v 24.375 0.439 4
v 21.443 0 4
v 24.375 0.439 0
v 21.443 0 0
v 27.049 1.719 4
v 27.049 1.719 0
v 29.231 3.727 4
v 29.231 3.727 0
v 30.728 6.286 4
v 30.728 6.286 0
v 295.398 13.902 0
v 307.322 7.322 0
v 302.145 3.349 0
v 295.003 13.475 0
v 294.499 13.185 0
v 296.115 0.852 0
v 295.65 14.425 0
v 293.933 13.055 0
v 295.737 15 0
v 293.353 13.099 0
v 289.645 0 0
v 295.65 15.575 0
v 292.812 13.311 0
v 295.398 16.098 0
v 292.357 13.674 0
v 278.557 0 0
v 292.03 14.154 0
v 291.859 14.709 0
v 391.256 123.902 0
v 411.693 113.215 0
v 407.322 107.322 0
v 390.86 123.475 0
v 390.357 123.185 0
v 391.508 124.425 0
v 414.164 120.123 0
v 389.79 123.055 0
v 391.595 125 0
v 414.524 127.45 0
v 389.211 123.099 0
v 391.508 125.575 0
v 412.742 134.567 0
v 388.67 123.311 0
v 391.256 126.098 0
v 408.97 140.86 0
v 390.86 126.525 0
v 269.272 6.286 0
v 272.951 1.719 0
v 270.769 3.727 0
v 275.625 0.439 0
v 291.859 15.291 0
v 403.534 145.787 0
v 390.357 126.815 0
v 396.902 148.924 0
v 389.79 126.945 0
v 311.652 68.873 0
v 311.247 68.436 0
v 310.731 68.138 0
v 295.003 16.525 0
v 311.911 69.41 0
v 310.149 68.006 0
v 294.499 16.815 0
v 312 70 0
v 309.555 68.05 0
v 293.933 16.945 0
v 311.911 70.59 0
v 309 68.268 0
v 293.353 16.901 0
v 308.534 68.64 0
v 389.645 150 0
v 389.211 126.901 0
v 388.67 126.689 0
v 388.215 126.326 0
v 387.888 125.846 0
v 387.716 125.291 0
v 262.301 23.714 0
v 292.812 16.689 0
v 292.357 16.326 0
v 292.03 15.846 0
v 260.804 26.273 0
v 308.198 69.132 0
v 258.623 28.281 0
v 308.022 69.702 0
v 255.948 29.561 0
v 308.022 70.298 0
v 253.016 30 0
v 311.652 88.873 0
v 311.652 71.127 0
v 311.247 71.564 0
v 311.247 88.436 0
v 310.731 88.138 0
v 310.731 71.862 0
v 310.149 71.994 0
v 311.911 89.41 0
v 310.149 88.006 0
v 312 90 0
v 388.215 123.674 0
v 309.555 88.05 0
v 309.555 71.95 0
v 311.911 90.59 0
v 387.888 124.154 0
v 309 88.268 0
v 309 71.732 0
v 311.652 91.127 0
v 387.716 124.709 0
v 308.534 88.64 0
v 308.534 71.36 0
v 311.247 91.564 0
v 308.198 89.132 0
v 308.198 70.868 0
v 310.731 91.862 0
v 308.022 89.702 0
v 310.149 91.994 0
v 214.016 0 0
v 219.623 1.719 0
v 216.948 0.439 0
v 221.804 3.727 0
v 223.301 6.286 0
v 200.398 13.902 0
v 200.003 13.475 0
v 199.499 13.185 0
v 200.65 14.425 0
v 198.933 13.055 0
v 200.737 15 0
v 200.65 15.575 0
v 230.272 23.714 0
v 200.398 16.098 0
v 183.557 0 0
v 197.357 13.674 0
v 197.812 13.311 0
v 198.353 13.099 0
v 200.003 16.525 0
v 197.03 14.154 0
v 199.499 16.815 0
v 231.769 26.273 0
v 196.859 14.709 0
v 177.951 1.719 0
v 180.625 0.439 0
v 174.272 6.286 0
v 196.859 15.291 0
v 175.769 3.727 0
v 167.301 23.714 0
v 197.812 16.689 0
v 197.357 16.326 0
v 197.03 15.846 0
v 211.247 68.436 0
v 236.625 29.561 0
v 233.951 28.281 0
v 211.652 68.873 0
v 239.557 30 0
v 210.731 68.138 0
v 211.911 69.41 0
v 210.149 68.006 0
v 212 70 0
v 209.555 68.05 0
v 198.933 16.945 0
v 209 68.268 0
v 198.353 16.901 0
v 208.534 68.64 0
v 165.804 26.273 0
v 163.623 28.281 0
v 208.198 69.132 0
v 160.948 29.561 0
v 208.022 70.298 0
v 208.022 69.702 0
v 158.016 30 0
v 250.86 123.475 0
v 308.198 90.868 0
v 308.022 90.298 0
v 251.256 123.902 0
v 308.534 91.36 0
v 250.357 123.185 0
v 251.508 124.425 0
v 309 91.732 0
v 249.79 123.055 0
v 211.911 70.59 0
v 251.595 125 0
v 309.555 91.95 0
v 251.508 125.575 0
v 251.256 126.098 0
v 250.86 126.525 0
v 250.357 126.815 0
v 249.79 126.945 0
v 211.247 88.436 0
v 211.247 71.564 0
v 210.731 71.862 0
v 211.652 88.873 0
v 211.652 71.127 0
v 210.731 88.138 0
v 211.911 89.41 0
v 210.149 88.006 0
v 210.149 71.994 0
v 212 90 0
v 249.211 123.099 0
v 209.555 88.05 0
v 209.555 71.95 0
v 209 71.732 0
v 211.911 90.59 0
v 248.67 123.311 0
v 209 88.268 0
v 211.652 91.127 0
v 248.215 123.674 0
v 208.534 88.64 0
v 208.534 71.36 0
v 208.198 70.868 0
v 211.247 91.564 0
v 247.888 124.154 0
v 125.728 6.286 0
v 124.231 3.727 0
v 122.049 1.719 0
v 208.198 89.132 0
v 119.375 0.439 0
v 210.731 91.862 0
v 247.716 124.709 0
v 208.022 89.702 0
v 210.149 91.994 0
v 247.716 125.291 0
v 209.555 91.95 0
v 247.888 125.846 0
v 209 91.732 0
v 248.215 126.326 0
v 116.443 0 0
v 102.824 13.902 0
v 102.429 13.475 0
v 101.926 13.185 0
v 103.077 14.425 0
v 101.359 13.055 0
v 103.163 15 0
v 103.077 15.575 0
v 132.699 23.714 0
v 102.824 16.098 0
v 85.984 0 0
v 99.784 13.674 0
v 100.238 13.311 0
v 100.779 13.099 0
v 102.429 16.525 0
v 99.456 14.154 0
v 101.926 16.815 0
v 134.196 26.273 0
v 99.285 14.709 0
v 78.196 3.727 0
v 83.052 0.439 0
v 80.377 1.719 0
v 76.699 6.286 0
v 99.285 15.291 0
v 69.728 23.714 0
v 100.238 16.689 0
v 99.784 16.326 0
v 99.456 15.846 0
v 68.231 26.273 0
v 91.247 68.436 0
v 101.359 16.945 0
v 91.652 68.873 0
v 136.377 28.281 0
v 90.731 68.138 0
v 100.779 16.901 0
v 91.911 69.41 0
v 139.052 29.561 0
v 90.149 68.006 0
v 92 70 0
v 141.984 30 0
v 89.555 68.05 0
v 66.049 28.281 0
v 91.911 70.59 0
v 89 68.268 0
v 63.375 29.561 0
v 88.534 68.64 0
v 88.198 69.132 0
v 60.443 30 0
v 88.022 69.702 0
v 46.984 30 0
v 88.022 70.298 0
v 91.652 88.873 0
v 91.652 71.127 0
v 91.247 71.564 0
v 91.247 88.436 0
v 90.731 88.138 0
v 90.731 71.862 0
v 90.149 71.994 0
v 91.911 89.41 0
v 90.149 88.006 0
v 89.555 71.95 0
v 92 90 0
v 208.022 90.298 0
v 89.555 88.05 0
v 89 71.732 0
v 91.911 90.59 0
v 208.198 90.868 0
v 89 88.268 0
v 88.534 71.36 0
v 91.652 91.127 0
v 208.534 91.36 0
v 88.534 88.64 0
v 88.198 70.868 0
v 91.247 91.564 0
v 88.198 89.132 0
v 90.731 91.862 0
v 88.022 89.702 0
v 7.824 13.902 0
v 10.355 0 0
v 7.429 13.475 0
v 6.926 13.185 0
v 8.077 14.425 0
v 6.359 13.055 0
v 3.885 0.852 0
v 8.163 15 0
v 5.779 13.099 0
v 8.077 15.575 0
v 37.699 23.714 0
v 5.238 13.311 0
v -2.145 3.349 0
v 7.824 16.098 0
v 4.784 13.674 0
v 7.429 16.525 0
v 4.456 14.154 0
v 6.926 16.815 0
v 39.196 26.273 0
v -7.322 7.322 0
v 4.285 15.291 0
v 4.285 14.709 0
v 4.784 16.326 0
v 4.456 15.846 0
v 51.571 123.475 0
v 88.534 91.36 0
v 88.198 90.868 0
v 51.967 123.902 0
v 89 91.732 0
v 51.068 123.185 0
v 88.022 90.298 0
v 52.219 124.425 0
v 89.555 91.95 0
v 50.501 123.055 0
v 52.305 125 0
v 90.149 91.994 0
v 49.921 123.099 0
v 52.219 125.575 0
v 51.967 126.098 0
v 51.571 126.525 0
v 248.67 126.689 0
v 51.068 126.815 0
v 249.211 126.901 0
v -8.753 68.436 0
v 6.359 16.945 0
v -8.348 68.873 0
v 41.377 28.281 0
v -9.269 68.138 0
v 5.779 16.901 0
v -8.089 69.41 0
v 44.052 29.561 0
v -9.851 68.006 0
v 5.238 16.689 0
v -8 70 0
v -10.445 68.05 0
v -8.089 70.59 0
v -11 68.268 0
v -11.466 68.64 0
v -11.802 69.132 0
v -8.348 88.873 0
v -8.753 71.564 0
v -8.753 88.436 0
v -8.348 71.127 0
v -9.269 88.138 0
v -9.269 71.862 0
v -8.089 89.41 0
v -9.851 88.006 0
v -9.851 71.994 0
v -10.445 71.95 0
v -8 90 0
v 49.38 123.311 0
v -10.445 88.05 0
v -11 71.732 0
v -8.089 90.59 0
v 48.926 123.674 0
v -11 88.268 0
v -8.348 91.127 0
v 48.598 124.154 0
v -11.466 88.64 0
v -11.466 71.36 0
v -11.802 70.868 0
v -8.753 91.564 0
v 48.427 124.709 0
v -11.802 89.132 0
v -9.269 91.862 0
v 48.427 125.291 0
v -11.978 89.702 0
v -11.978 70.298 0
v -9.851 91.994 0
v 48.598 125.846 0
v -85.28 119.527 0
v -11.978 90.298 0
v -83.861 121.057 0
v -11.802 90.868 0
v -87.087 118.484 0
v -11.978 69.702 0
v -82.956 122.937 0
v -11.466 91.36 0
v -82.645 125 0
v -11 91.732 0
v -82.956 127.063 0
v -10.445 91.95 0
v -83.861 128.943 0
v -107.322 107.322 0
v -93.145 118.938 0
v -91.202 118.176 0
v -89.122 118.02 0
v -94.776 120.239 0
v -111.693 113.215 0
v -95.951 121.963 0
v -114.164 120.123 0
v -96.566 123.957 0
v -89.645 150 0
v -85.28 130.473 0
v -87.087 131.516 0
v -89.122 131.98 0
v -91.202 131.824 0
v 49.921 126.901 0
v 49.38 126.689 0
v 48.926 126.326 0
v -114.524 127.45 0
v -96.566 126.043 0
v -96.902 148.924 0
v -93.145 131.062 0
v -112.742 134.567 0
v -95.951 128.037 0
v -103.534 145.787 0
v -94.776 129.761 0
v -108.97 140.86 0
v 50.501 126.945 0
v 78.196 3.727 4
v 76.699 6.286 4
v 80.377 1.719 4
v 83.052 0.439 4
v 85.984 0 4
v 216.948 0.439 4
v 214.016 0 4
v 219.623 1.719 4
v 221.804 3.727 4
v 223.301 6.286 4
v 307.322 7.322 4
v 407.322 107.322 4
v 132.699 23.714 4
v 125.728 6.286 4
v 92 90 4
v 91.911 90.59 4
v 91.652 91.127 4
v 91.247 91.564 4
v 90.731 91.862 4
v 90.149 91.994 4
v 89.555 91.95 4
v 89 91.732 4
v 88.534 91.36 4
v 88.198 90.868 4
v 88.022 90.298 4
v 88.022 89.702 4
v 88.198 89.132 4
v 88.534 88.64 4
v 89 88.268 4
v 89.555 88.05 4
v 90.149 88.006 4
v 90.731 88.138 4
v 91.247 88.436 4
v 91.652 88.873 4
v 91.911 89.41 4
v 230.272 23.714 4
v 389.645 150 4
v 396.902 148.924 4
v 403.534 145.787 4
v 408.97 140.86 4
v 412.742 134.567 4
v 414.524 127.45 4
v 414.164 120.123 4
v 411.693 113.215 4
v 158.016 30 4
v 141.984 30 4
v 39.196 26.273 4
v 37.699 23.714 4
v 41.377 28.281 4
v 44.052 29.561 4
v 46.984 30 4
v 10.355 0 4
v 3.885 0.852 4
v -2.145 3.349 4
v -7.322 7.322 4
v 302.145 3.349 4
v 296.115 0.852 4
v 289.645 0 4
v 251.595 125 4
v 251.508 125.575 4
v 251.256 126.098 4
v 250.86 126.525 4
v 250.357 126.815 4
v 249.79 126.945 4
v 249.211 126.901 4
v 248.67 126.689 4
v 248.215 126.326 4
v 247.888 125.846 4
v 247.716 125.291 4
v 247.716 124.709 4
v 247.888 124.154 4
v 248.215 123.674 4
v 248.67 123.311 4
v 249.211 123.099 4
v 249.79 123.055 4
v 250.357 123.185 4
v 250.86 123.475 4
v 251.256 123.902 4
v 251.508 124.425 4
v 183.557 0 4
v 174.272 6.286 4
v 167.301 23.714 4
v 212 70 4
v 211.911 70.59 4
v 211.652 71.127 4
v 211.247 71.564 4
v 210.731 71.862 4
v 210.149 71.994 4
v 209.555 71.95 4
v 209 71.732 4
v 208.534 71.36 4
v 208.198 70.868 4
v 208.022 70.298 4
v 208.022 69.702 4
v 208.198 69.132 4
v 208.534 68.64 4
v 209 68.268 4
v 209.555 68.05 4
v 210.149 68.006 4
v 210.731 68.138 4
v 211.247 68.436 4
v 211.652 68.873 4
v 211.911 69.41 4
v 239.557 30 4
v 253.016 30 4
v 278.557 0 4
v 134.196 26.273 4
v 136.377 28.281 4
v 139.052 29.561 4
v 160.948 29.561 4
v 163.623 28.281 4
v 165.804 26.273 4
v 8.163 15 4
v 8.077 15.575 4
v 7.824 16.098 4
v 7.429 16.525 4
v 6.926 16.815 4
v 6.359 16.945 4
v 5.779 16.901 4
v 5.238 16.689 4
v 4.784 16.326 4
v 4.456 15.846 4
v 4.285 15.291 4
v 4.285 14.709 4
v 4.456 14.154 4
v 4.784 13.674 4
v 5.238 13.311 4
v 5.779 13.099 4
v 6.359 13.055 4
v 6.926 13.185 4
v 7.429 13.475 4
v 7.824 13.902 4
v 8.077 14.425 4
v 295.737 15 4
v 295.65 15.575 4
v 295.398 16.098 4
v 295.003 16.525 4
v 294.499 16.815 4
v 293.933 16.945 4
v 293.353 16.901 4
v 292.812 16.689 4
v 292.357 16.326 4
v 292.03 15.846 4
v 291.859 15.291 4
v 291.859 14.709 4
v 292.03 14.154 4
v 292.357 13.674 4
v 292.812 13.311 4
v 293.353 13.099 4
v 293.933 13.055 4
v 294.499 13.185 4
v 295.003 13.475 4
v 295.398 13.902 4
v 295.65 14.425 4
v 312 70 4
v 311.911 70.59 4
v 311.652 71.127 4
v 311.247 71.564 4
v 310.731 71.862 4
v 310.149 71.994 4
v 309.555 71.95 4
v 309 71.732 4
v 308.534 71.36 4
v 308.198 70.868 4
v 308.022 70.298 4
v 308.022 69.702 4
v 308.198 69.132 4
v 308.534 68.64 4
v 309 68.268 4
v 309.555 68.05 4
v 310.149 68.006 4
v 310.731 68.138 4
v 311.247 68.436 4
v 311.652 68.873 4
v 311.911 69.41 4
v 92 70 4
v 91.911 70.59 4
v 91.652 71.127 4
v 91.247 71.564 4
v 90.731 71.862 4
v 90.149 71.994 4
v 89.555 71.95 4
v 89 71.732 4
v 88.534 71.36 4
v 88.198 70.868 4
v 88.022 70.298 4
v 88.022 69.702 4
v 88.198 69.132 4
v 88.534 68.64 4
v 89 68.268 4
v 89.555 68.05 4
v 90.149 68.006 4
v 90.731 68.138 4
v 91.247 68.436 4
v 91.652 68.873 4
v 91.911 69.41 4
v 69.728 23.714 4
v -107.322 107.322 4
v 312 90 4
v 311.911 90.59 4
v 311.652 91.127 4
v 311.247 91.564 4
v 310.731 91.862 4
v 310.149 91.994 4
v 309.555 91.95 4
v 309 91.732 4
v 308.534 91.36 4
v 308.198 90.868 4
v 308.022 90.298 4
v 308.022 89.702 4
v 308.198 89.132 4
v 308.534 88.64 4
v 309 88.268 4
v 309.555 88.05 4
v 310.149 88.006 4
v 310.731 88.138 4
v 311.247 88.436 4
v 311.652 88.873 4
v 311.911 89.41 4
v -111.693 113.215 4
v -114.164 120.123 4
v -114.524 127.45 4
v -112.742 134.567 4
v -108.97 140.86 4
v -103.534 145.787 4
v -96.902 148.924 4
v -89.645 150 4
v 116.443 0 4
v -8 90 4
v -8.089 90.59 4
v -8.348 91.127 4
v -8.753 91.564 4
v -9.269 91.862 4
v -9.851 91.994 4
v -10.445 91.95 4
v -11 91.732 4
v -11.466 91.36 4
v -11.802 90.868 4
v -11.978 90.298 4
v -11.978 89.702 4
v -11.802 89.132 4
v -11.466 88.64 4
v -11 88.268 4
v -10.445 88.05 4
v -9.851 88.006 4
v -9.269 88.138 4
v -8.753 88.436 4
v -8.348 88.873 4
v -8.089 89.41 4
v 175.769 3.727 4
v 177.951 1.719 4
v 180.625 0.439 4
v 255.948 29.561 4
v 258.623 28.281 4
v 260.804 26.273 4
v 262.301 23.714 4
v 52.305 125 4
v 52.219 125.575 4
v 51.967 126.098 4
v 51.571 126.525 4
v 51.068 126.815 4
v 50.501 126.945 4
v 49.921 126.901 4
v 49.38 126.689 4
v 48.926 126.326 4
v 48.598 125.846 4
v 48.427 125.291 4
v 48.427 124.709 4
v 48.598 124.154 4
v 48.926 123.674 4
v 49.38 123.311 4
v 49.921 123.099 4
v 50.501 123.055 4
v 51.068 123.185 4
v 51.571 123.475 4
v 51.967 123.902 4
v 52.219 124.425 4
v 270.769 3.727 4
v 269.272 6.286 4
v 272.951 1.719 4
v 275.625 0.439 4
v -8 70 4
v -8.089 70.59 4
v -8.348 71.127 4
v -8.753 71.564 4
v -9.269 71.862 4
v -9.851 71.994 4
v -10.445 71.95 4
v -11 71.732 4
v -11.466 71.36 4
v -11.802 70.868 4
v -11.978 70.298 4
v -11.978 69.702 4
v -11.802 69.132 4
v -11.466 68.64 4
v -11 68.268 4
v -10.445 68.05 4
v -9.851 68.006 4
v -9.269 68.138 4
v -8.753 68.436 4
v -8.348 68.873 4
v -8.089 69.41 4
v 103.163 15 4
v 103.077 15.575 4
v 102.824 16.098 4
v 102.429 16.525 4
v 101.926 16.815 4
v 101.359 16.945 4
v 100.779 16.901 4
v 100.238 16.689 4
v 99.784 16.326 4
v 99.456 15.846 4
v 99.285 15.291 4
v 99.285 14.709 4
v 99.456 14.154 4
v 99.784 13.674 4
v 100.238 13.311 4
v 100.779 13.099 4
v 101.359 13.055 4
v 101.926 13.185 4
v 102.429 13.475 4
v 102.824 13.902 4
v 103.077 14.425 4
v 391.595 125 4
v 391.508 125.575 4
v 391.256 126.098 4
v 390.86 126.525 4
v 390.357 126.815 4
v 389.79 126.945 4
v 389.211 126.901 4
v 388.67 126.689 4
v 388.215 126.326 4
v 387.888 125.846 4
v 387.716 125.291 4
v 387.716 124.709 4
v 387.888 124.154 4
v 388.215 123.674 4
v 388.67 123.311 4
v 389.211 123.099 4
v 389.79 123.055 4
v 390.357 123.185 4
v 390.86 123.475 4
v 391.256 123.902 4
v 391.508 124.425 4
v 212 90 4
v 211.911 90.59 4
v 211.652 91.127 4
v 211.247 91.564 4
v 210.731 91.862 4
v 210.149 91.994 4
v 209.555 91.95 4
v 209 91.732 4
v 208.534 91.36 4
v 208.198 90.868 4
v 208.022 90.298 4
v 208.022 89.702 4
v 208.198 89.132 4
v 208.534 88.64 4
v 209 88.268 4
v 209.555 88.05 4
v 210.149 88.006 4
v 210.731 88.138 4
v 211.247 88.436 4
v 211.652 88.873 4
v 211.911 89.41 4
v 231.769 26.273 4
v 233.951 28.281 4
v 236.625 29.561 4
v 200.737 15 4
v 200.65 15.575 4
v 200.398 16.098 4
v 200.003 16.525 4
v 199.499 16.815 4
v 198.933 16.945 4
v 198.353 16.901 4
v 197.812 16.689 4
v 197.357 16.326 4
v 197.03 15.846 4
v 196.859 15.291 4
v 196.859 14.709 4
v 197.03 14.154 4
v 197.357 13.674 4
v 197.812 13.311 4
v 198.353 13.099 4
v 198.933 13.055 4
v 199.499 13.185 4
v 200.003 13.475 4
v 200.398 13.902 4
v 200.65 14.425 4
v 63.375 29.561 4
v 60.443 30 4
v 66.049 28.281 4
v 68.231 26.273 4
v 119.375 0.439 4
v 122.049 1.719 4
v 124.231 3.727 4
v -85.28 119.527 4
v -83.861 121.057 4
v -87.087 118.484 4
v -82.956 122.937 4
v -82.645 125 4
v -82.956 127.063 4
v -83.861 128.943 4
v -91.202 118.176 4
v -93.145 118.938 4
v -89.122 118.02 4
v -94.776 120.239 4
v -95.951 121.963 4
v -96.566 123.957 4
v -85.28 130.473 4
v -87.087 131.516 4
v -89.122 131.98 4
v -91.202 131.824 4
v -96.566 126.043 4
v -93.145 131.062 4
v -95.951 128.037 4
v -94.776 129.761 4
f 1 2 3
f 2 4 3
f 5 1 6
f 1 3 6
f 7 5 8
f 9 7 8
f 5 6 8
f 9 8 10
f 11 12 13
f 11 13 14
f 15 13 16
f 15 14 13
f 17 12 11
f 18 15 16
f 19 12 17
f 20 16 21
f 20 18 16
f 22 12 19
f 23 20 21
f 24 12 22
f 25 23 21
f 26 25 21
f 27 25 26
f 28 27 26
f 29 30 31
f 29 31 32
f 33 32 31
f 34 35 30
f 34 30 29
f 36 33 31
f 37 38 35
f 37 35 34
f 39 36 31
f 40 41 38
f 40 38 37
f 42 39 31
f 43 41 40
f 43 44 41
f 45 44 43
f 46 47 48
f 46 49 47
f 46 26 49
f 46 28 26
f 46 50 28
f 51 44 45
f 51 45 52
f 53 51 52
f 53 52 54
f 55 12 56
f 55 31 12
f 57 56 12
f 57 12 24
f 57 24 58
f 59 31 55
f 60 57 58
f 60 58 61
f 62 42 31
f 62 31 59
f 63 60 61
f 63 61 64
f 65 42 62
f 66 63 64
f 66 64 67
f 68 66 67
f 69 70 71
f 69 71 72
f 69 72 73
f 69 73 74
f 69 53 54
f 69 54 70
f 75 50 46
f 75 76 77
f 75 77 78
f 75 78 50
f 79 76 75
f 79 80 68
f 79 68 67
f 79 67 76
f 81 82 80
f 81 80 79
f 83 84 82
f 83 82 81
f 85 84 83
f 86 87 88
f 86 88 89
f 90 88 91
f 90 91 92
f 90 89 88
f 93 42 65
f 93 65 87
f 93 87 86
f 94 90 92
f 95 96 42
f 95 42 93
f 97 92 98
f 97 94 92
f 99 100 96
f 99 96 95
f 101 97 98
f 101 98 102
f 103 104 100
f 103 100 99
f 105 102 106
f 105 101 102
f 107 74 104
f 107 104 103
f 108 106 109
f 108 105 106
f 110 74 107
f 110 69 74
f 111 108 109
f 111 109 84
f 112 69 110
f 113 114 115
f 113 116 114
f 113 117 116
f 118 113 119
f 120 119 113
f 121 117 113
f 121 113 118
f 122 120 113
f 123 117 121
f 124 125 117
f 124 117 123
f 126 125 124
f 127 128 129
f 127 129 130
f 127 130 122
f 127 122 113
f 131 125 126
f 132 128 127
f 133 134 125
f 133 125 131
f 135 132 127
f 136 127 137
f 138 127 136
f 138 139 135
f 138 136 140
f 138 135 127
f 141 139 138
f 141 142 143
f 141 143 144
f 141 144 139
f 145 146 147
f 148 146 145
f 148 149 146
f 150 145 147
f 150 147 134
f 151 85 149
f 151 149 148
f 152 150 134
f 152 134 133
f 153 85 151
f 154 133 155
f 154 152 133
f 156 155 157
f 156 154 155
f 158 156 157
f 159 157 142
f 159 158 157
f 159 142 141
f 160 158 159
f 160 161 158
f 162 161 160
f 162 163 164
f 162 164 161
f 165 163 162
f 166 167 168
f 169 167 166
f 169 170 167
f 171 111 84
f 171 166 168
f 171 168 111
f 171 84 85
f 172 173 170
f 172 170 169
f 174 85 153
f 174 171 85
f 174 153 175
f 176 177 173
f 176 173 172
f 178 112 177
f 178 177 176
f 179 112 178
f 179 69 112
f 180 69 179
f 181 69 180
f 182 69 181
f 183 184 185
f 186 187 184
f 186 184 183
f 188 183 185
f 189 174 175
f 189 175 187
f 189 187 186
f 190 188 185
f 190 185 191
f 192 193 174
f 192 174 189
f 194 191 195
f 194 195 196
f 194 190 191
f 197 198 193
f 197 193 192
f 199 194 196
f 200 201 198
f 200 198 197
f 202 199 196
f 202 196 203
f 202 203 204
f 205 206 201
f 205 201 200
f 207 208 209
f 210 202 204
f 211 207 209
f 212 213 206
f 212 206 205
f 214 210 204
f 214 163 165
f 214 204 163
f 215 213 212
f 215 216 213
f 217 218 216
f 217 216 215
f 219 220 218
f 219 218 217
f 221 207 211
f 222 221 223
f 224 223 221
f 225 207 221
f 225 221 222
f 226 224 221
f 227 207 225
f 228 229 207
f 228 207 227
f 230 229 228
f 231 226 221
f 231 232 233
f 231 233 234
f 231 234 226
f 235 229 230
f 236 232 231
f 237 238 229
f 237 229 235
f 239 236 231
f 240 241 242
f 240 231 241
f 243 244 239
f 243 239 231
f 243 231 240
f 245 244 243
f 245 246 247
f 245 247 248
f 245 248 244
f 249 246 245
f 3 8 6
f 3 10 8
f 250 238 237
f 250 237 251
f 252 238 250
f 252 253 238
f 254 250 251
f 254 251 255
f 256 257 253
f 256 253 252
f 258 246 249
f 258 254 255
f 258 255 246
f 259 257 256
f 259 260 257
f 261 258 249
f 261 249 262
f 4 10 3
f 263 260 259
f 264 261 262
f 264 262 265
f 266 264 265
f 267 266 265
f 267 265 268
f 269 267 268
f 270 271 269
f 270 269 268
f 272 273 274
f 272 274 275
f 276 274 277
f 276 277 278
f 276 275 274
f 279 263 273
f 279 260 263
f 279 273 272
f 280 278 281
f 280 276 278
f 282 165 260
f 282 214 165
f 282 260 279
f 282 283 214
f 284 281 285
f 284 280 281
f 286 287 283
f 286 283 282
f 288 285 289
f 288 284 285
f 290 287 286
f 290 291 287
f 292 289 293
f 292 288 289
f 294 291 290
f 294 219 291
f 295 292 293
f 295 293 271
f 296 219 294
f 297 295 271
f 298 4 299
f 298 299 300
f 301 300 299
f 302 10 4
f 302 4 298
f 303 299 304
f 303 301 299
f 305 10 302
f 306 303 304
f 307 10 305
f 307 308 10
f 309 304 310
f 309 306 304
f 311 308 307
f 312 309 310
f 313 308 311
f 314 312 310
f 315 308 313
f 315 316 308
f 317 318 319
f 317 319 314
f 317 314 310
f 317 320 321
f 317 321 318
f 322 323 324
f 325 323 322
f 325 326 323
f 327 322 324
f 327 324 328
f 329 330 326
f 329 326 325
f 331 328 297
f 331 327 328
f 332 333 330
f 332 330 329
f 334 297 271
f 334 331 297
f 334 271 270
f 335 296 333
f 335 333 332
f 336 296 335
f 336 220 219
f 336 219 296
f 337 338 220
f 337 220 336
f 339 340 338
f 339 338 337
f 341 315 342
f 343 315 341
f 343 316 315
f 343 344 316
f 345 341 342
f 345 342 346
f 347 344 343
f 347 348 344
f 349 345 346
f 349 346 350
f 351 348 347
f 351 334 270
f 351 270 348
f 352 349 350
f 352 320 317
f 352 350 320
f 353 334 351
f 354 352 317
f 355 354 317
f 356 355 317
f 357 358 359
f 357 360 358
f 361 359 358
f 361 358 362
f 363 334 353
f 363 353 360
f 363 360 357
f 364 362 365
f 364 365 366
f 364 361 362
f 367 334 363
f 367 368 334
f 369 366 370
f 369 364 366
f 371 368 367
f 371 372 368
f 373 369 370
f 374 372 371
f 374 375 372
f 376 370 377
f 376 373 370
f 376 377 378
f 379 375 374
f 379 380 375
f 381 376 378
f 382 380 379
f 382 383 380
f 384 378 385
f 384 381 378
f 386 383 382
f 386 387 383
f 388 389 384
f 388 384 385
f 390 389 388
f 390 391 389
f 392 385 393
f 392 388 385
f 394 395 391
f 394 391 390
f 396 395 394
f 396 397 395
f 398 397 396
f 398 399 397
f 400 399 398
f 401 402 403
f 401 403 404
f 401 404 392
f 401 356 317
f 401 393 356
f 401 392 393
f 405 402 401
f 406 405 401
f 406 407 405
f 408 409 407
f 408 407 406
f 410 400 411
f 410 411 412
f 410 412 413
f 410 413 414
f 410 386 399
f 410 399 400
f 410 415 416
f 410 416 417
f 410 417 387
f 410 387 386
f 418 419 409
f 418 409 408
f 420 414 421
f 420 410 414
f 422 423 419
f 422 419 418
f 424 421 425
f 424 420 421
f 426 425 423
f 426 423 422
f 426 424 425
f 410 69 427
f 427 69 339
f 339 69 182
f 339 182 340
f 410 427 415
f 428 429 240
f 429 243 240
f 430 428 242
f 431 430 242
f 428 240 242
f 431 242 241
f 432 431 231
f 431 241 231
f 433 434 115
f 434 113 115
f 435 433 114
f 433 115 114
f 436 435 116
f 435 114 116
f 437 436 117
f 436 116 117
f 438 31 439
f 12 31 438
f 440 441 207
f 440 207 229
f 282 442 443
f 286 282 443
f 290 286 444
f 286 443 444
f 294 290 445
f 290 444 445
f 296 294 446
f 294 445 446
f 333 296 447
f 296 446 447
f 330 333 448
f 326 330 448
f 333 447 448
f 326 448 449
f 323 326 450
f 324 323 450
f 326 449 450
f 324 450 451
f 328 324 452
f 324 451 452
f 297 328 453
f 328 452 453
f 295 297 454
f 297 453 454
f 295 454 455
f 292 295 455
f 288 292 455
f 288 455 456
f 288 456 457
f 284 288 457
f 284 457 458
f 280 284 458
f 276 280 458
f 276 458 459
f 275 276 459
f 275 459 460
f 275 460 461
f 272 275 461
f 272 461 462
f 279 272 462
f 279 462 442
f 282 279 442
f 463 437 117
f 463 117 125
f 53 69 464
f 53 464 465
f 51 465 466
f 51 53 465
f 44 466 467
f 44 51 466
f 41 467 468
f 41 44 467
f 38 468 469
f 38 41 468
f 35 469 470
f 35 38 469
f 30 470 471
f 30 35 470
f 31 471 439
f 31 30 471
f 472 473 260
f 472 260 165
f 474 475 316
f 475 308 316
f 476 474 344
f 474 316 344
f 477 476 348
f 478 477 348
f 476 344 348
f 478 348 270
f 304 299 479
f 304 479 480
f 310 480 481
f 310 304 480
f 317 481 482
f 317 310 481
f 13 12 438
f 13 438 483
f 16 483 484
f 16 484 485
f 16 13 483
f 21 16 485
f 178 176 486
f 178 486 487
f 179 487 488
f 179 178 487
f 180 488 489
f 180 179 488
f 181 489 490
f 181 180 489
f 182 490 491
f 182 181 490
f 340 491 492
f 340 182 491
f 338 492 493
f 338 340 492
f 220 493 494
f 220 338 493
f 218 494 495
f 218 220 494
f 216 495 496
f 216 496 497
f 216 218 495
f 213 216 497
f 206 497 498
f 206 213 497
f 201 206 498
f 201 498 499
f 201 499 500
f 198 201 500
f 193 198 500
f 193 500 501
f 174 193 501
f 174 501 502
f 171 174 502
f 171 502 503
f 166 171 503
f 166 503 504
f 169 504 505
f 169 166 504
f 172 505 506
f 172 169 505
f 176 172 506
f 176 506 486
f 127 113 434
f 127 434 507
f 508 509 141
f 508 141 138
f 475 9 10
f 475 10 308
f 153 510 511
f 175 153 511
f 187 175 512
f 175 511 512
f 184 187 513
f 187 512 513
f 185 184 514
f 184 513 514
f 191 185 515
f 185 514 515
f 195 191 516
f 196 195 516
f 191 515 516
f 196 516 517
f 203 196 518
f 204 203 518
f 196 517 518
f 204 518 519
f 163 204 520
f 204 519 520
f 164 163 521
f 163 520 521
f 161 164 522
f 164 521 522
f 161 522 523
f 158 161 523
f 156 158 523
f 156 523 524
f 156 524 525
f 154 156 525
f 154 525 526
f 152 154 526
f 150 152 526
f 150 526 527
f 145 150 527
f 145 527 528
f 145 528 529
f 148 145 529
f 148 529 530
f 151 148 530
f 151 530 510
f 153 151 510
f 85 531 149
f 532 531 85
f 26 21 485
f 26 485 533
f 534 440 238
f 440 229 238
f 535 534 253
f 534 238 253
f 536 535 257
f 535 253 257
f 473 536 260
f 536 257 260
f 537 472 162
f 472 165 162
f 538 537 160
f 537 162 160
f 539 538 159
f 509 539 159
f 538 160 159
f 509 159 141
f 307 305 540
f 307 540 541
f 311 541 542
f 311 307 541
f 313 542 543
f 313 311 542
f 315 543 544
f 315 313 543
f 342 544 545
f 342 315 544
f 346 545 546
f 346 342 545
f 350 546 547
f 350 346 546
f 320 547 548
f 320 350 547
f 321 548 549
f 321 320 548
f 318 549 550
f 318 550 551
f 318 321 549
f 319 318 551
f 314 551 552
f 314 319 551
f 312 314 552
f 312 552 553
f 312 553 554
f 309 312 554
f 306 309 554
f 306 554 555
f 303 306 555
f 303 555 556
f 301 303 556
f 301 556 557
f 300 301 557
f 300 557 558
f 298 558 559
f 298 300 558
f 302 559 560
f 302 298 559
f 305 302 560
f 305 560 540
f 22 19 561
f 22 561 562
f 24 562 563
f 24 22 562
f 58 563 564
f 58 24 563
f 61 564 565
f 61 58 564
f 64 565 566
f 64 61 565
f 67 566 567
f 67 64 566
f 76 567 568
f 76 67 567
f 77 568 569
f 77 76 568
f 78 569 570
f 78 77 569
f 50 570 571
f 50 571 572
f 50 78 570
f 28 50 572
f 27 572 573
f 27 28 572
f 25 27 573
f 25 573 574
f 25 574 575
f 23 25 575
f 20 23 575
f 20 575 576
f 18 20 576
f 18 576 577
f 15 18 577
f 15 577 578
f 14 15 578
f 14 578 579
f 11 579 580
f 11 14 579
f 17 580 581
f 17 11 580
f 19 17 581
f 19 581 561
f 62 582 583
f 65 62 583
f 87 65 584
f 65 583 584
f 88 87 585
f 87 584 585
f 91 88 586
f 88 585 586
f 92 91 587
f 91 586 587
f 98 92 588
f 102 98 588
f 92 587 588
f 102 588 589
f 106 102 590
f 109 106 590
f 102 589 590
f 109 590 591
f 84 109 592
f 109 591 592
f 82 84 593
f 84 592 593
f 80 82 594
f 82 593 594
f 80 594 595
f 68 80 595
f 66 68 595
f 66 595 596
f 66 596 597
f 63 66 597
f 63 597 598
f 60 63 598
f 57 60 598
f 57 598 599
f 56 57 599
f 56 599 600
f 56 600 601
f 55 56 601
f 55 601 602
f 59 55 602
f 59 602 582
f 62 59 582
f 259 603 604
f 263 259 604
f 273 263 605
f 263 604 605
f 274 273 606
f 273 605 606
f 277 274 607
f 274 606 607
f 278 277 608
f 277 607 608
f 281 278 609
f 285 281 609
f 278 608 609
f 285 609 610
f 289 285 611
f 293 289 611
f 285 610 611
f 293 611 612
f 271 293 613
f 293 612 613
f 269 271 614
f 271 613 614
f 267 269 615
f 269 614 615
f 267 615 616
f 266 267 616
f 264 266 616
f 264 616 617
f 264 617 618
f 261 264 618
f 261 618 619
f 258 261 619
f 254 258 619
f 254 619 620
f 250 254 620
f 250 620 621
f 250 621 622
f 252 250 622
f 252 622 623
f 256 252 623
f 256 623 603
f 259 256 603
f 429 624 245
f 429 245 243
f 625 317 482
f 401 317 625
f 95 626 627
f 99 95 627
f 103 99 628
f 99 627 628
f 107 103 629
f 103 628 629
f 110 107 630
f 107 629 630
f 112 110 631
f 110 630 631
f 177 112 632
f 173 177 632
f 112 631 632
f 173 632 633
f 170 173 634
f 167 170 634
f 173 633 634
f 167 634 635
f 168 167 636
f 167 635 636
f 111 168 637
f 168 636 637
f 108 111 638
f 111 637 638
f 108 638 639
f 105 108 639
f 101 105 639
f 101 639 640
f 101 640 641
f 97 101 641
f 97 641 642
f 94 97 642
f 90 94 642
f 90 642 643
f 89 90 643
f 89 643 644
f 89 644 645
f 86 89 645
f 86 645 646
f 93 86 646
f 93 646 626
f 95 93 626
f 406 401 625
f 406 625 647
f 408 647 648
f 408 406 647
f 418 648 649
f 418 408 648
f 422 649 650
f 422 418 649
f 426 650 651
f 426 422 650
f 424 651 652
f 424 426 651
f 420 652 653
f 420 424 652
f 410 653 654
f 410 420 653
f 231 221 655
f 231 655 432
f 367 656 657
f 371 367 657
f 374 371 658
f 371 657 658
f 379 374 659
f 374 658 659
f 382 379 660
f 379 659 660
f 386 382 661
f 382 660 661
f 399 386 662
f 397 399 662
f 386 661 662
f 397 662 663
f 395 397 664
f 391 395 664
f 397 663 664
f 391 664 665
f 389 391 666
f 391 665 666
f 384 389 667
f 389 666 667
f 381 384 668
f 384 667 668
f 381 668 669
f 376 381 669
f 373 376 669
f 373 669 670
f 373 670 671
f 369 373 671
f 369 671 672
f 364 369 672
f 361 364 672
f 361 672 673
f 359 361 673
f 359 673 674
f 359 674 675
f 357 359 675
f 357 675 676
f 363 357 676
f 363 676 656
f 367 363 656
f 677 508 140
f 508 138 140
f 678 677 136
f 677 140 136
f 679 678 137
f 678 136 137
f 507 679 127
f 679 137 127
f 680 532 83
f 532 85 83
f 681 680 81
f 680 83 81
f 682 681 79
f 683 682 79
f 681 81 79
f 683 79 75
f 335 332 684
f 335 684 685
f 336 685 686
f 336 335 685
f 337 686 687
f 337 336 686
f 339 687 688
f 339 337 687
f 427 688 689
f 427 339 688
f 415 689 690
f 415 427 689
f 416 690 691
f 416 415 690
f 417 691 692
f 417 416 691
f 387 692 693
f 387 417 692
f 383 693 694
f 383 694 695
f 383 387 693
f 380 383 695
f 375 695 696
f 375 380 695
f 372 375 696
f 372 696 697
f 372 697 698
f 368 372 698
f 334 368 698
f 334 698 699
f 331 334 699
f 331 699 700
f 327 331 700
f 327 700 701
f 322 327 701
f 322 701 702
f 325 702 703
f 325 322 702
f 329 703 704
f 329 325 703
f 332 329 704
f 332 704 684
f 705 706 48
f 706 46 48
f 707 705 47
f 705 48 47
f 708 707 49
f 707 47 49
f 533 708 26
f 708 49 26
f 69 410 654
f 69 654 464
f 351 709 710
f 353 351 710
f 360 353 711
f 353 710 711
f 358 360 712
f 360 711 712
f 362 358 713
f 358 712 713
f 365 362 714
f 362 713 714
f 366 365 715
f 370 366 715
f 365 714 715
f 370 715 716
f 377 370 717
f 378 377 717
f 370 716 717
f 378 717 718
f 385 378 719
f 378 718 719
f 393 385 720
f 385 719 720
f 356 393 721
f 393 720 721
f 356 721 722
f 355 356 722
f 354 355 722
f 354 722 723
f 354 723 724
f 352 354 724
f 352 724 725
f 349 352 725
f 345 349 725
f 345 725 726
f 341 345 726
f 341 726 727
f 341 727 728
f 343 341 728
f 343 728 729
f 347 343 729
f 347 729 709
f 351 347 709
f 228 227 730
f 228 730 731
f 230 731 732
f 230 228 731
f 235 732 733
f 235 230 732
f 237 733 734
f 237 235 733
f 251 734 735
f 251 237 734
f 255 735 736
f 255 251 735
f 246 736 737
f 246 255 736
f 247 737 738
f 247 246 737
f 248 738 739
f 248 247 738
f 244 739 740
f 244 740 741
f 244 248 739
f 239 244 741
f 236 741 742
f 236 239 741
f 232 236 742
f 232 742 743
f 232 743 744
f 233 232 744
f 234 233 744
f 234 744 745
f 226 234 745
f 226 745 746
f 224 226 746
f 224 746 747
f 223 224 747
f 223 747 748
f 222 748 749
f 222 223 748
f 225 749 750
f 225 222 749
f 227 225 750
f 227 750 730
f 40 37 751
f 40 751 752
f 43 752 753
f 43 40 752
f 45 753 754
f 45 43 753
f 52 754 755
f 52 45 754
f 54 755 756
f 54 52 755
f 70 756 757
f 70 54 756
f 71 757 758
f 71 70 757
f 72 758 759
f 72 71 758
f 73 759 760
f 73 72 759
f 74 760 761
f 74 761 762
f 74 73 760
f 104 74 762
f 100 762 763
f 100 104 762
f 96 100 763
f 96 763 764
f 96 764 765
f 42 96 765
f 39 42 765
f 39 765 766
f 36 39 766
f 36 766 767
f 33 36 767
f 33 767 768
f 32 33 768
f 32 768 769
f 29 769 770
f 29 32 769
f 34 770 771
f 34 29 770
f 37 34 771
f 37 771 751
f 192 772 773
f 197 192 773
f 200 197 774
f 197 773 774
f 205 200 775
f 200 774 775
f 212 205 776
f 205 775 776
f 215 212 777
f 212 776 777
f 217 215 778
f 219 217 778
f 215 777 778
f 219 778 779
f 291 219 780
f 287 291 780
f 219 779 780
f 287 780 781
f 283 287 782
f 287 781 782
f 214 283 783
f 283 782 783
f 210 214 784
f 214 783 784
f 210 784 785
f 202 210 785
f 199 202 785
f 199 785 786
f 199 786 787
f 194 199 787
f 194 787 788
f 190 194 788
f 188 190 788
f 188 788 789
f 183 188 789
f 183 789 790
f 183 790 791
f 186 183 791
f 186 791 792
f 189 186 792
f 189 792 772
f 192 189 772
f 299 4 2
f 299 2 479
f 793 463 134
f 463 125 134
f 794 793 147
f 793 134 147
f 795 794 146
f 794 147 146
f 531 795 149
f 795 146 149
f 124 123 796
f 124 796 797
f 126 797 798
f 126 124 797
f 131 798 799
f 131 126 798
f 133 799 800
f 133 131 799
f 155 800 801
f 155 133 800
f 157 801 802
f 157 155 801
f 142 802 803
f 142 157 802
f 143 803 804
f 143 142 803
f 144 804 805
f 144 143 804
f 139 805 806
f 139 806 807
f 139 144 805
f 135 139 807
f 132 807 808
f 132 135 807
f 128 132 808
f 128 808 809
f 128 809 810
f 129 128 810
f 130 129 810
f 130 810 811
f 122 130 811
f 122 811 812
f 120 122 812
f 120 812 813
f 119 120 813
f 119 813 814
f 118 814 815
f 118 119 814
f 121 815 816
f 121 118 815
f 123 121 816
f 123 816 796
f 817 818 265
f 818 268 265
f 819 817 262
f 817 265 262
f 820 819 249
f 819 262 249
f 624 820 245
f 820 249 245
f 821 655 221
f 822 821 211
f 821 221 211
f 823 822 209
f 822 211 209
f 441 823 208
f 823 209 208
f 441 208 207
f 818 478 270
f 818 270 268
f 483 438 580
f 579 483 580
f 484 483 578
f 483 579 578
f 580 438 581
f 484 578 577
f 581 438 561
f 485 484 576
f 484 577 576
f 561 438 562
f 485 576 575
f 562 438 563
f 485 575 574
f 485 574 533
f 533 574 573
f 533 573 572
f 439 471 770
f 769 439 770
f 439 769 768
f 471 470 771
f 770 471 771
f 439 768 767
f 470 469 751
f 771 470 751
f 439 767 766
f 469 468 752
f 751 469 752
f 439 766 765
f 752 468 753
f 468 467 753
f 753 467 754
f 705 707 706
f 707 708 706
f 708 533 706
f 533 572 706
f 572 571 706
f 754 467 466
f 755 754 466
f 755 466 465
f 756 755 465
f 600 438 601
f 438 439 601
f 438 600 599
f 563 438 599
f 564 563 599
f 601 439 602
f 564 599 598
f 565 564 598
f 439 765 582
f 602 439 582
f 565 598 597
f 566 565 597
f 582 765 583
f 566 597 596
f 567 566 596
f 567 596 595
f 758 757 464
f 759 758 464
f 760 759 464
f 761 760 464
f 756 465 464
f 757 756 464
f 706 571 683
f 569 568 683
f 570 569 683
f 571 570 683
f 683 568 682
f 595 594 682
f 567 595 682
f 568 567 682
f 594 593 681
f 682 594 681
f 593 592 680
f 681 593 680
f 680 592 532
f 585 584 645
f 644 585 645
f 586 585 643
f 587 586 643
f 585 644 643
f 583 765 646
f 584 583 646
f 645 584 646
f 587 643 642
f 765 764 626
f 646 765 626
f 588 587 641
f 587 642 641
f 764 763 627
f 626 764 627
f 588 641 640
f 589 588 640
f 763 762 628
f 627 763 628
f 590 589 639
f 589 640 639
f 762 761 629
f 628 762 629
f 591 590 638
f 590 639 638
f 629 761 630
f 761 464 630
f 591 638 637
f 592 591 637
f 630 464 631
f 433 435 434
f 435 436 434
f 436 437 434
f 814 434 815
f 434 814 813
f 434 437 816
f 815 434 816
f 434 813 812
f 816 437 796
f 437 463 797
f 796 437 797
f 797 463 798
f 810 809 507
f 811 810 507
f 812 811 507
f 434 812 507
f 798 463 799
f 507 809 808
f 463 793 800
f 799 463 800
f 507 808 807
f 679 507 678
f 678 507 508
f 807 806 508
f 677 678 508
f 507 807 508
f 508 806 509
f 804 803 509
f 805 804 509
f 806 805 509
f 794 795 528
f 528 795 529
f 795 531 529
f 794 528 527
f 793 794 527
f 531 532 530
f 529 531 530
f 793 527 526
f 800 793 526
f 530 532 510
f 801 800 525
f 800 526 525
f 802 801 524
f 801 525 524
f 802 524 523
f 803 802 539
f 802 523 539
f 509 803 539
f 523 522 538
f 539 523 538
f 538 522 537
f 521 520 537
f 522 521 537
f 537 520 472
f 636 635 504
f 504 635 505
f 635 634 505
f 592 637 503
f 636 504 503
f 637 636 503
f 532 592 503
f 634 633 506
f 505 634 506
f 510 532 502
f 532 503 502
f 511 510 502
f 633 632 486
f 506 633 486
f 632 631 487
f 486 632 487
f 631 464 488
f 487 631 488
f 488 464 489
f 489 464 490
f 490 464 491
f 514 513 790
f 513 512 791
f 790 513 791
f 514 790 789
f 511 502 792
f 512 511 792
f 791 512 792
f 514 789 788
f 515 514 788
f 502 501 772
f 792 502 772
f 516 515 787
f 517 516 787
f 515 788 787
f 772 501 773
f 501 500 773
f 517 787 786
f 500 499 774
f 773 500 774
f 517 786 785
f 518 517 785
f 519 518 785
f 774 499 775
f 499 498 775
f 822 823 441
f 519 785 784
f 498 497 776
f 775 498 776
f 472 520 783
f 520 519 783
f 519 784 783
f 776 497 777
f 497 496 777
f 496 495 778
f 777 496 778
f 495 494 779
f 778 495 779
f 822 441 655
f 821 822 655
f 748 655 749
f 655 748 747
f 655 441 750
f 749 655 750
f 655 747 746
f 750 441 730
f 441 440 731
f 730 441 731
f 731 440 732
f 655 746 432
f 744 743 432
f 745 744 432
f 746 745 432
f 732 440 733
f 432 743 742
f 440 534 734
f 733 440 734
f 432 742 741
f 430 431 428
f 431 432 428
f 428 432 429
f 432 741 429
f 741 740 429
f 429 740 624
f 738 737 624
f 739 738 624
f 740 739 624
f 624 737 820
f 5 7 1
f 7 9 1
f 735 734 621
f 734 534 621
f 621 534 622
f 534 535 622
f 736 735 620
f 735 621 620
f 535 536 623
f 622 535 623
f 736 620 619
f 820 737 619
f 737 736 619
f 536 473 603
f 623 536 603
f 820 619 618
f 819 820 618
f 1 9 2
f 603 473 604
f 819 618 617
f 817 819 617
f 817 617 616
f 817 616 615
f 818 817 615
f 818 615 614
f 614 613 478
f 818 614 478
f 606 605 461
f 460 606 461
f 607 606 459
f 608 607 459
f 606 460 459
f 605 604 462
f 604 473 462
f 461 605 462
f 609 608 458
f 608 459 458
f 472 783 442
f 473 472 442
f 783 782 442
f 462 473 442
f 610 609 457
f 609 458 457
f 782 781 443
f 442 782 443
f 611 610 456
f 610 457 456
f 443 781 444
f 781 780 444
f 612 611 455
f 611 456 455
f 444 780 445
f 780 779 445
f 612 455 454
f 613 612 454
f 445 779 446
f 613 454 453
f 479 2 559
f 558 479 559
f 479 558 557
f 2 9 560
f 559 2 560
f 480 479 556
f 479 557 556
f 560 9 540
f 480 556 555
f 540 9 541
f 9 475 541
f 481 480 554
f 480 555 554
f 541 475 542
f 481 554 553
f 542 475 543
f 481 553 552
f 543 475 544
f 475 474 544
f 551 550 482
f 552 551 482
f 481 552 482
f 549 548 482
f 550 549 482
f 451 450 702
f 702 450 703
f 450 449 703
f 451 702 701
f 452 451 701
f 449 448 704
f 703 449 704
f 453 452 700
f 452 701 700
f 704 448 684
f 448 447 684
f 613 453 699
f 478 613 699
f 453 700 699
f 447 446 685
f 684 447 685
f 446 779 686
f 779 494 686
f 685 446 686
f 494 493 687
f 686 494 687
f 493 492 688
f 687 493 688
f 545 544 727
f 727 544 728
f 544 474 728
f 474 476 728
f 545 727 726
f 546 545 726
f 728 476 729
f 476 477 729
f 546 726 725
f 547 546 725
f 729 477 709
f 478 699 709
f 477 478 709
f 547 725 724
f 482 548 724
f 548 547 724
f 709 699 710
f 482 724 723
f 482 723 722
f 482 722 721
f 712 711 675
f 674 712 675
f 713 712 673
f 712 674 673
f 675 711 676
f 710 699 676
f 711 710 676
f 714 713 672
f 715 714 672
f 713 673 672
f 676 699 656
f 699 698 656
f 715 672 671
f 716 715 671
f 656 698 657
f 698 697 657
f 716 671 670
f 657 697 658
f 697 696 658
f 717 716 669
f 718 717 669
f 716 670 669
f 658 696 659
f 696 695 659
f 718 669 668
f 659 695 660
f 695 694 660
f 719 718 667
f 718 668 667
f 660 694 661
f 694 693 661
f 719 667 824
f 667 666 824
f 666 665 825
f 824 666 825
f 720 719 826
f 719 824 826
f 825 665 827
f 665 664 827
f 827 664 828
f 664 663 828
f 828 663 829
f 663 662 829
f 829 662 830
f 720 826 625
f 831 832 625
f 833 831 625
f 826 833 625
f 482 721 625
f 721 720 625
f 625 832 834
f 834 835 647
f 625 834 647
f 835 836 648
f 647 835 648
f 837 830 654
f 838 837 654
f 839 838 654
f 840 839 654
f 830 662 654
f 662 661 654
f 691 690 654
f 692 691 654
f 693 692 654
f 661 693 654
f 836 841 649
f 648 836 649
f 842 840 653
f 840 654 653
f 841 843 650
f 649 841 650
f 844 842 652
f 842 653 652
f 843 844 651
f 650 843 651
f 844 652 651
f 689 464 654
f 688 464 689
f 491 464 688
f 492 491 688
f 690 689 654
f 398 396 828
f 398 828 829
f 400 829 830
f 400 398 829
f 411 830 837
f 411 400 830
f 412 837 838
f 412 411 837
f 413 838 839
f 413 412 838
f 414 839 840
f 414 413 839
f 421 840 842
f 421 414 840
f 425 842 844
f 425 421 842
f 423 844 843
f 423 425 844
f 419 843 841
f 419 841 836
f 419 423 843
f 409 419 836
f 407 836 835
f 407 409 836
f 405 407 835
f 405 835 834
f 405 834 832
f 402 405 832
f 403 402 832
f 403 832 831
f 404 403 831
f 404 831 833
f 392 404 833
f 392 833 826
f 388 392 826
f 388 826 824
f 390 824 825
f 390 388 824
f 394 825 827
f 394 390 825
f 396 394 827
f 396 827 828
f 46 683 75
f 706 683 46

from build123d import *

# Parameters (mm, degrees)
SKETCH_1_R          = 1.95
SKETCH_1_R_2        = 7
EXTRUDE_1_DEPTH     = 4
SKETCH_2_R          = 2
CUT_EXTRUDE_1_DEPTH = 10
CUT_EXTRUDE_2_DEPTH = 10
FILLET_1_R          = 10


with BuildPart() as part:
    # 草图1 → 凸台-拉伸1 (new body)
    with BuildSketch(Plane.XY):
        with BuildLine():
            Line((-7.32233047, 7.32233047), (-107.32233047, 107.32233047))
            ThreePointArc((-107.32233047, 107.32233047), (-112.741649253, 134.567085809), (-89.644660941, 150))
            Line((-89.644660941, 150), (389.644660941, 150))
            ThreePointArc((389.644660941, 150), (412.741649253, 134.567085809), (407.32233047, 107.32233047))
            Line((407.32233047, 107.32233047), (307.32233047, 7.32233047))
            ThreePointArc((307.32233047, 7.32233047), (299.21174675, 1.903011687), (289.644660941, 0))
            Line((289.644660941, 0), (10.355339059, 0))
            ThreePointArc((10.355339059, 0), (0.78825325, 1.903011687), (-7.32233047, 7.32233047))
        make_face()
        with Locations((50.355339059, 125)):
            Circle(SKETCH_1_R, mode=Mode.SUBTRACT)
        with Locations((249.644660941, 125)):
            Circle(SKETCH_1_R, mode=Mode.SUBTRACT)
        with Locations((101.213203436, 15)):
            Circle(SKETCH_1_R, mode=Mode.SUBTRACT)
        with Locations((198.786796564, 15)):
            Circle(SKETCH_1_R, mode=Mode.SUBTRACT)
        with Locations((-89.644660941, 125)):
            Circle(SKETCH_1_R_2, mode=Mode.SUBTRACT)
        with Locations((6.213203436, 15)):
            Circle(SKETCH_1_R, mode=Mode.SUBTRACT)
        with Locations((293.786796564, 15)):
            Circle(SKETCH_1_R, mode=Mode.SUBTRACT)
        with Locations((389.644660941, 125)):
            Circle(SKETCH_1_R, mode=Mode.SUBTRACT)
    extrude(amount=EXTRUDE_1_DEPTH)

    # 草图2 → 切除-拉伸1 (cut)
    with BuildSketch(Plane.XY.offset(4)):
        with Locations((-10, 90)):
            Circle(SKETCH_2_R)
        with Locations((90, 90)):
            Circle(SKETCH_2_R)
        with Locations((210, 90)):
            Circle(SKETCH_2_R)
        with Locations((310, 90)):
            Circle(SKETCH_2_R)
        with Locations((-10, 70)):
            Circle(SKETCH_2_R)
        with Locations((90, 70)):
            Circle(SKETCH_2_R)
        with Locations((210, 70)):
            Circle(SKETCH_2_R)
        with Locations((310, 70)):
            Circle(SKETCH_2_R)
    extrude(amount=-CUT_EXTRUDE_1_DEPTH, mode=Mode.SUBTRACT)

    # 草图3 → 切除-拉伸2 (cut)
    with BuildSketch(Plane.XY.offset(4)):
        Polygon((28.213203436, 0), (40.213203436, 30), (67.213203436, 30), (79.213203436, 0), align=None)
        Polygon((123.213203436, 0), (135.213203436, 30), (164.786796564, 30), (176.786796564, 0), align=None)
        Polygon((220.786796564, 0), (232.786796564, 30), (259.786796564, 30), (271.786796564, 0), align=None)
    extrude(amount=-CUT_EXTRUDE_2_DEPTH, mode=Mode.SUBTRACT)

    # 圆角1
    fillet_1_edges = [part.edges().sort_by_distance(p)[0] for p in [
        (271.786796564, 0, 2),
        (220.786796564, 0, 2),
        (176.786796564, 0, 2),
        (123.213203436, 0, 2),
        (79.213203436, 0, 2),
        (28.213203436, 0, 2),
        (40.213203436, 30, 2),
        (67.213203436, 30, 2),
        (135.213203436, 30, 2),
        (164.786796564, 30, 2),
        (232.786796564, 30, 2),
        (259.786796564, 30, 2),
    ]]
    fillet(fillet_1_edges, radius=FILLET_1_R)


solid = part.part
